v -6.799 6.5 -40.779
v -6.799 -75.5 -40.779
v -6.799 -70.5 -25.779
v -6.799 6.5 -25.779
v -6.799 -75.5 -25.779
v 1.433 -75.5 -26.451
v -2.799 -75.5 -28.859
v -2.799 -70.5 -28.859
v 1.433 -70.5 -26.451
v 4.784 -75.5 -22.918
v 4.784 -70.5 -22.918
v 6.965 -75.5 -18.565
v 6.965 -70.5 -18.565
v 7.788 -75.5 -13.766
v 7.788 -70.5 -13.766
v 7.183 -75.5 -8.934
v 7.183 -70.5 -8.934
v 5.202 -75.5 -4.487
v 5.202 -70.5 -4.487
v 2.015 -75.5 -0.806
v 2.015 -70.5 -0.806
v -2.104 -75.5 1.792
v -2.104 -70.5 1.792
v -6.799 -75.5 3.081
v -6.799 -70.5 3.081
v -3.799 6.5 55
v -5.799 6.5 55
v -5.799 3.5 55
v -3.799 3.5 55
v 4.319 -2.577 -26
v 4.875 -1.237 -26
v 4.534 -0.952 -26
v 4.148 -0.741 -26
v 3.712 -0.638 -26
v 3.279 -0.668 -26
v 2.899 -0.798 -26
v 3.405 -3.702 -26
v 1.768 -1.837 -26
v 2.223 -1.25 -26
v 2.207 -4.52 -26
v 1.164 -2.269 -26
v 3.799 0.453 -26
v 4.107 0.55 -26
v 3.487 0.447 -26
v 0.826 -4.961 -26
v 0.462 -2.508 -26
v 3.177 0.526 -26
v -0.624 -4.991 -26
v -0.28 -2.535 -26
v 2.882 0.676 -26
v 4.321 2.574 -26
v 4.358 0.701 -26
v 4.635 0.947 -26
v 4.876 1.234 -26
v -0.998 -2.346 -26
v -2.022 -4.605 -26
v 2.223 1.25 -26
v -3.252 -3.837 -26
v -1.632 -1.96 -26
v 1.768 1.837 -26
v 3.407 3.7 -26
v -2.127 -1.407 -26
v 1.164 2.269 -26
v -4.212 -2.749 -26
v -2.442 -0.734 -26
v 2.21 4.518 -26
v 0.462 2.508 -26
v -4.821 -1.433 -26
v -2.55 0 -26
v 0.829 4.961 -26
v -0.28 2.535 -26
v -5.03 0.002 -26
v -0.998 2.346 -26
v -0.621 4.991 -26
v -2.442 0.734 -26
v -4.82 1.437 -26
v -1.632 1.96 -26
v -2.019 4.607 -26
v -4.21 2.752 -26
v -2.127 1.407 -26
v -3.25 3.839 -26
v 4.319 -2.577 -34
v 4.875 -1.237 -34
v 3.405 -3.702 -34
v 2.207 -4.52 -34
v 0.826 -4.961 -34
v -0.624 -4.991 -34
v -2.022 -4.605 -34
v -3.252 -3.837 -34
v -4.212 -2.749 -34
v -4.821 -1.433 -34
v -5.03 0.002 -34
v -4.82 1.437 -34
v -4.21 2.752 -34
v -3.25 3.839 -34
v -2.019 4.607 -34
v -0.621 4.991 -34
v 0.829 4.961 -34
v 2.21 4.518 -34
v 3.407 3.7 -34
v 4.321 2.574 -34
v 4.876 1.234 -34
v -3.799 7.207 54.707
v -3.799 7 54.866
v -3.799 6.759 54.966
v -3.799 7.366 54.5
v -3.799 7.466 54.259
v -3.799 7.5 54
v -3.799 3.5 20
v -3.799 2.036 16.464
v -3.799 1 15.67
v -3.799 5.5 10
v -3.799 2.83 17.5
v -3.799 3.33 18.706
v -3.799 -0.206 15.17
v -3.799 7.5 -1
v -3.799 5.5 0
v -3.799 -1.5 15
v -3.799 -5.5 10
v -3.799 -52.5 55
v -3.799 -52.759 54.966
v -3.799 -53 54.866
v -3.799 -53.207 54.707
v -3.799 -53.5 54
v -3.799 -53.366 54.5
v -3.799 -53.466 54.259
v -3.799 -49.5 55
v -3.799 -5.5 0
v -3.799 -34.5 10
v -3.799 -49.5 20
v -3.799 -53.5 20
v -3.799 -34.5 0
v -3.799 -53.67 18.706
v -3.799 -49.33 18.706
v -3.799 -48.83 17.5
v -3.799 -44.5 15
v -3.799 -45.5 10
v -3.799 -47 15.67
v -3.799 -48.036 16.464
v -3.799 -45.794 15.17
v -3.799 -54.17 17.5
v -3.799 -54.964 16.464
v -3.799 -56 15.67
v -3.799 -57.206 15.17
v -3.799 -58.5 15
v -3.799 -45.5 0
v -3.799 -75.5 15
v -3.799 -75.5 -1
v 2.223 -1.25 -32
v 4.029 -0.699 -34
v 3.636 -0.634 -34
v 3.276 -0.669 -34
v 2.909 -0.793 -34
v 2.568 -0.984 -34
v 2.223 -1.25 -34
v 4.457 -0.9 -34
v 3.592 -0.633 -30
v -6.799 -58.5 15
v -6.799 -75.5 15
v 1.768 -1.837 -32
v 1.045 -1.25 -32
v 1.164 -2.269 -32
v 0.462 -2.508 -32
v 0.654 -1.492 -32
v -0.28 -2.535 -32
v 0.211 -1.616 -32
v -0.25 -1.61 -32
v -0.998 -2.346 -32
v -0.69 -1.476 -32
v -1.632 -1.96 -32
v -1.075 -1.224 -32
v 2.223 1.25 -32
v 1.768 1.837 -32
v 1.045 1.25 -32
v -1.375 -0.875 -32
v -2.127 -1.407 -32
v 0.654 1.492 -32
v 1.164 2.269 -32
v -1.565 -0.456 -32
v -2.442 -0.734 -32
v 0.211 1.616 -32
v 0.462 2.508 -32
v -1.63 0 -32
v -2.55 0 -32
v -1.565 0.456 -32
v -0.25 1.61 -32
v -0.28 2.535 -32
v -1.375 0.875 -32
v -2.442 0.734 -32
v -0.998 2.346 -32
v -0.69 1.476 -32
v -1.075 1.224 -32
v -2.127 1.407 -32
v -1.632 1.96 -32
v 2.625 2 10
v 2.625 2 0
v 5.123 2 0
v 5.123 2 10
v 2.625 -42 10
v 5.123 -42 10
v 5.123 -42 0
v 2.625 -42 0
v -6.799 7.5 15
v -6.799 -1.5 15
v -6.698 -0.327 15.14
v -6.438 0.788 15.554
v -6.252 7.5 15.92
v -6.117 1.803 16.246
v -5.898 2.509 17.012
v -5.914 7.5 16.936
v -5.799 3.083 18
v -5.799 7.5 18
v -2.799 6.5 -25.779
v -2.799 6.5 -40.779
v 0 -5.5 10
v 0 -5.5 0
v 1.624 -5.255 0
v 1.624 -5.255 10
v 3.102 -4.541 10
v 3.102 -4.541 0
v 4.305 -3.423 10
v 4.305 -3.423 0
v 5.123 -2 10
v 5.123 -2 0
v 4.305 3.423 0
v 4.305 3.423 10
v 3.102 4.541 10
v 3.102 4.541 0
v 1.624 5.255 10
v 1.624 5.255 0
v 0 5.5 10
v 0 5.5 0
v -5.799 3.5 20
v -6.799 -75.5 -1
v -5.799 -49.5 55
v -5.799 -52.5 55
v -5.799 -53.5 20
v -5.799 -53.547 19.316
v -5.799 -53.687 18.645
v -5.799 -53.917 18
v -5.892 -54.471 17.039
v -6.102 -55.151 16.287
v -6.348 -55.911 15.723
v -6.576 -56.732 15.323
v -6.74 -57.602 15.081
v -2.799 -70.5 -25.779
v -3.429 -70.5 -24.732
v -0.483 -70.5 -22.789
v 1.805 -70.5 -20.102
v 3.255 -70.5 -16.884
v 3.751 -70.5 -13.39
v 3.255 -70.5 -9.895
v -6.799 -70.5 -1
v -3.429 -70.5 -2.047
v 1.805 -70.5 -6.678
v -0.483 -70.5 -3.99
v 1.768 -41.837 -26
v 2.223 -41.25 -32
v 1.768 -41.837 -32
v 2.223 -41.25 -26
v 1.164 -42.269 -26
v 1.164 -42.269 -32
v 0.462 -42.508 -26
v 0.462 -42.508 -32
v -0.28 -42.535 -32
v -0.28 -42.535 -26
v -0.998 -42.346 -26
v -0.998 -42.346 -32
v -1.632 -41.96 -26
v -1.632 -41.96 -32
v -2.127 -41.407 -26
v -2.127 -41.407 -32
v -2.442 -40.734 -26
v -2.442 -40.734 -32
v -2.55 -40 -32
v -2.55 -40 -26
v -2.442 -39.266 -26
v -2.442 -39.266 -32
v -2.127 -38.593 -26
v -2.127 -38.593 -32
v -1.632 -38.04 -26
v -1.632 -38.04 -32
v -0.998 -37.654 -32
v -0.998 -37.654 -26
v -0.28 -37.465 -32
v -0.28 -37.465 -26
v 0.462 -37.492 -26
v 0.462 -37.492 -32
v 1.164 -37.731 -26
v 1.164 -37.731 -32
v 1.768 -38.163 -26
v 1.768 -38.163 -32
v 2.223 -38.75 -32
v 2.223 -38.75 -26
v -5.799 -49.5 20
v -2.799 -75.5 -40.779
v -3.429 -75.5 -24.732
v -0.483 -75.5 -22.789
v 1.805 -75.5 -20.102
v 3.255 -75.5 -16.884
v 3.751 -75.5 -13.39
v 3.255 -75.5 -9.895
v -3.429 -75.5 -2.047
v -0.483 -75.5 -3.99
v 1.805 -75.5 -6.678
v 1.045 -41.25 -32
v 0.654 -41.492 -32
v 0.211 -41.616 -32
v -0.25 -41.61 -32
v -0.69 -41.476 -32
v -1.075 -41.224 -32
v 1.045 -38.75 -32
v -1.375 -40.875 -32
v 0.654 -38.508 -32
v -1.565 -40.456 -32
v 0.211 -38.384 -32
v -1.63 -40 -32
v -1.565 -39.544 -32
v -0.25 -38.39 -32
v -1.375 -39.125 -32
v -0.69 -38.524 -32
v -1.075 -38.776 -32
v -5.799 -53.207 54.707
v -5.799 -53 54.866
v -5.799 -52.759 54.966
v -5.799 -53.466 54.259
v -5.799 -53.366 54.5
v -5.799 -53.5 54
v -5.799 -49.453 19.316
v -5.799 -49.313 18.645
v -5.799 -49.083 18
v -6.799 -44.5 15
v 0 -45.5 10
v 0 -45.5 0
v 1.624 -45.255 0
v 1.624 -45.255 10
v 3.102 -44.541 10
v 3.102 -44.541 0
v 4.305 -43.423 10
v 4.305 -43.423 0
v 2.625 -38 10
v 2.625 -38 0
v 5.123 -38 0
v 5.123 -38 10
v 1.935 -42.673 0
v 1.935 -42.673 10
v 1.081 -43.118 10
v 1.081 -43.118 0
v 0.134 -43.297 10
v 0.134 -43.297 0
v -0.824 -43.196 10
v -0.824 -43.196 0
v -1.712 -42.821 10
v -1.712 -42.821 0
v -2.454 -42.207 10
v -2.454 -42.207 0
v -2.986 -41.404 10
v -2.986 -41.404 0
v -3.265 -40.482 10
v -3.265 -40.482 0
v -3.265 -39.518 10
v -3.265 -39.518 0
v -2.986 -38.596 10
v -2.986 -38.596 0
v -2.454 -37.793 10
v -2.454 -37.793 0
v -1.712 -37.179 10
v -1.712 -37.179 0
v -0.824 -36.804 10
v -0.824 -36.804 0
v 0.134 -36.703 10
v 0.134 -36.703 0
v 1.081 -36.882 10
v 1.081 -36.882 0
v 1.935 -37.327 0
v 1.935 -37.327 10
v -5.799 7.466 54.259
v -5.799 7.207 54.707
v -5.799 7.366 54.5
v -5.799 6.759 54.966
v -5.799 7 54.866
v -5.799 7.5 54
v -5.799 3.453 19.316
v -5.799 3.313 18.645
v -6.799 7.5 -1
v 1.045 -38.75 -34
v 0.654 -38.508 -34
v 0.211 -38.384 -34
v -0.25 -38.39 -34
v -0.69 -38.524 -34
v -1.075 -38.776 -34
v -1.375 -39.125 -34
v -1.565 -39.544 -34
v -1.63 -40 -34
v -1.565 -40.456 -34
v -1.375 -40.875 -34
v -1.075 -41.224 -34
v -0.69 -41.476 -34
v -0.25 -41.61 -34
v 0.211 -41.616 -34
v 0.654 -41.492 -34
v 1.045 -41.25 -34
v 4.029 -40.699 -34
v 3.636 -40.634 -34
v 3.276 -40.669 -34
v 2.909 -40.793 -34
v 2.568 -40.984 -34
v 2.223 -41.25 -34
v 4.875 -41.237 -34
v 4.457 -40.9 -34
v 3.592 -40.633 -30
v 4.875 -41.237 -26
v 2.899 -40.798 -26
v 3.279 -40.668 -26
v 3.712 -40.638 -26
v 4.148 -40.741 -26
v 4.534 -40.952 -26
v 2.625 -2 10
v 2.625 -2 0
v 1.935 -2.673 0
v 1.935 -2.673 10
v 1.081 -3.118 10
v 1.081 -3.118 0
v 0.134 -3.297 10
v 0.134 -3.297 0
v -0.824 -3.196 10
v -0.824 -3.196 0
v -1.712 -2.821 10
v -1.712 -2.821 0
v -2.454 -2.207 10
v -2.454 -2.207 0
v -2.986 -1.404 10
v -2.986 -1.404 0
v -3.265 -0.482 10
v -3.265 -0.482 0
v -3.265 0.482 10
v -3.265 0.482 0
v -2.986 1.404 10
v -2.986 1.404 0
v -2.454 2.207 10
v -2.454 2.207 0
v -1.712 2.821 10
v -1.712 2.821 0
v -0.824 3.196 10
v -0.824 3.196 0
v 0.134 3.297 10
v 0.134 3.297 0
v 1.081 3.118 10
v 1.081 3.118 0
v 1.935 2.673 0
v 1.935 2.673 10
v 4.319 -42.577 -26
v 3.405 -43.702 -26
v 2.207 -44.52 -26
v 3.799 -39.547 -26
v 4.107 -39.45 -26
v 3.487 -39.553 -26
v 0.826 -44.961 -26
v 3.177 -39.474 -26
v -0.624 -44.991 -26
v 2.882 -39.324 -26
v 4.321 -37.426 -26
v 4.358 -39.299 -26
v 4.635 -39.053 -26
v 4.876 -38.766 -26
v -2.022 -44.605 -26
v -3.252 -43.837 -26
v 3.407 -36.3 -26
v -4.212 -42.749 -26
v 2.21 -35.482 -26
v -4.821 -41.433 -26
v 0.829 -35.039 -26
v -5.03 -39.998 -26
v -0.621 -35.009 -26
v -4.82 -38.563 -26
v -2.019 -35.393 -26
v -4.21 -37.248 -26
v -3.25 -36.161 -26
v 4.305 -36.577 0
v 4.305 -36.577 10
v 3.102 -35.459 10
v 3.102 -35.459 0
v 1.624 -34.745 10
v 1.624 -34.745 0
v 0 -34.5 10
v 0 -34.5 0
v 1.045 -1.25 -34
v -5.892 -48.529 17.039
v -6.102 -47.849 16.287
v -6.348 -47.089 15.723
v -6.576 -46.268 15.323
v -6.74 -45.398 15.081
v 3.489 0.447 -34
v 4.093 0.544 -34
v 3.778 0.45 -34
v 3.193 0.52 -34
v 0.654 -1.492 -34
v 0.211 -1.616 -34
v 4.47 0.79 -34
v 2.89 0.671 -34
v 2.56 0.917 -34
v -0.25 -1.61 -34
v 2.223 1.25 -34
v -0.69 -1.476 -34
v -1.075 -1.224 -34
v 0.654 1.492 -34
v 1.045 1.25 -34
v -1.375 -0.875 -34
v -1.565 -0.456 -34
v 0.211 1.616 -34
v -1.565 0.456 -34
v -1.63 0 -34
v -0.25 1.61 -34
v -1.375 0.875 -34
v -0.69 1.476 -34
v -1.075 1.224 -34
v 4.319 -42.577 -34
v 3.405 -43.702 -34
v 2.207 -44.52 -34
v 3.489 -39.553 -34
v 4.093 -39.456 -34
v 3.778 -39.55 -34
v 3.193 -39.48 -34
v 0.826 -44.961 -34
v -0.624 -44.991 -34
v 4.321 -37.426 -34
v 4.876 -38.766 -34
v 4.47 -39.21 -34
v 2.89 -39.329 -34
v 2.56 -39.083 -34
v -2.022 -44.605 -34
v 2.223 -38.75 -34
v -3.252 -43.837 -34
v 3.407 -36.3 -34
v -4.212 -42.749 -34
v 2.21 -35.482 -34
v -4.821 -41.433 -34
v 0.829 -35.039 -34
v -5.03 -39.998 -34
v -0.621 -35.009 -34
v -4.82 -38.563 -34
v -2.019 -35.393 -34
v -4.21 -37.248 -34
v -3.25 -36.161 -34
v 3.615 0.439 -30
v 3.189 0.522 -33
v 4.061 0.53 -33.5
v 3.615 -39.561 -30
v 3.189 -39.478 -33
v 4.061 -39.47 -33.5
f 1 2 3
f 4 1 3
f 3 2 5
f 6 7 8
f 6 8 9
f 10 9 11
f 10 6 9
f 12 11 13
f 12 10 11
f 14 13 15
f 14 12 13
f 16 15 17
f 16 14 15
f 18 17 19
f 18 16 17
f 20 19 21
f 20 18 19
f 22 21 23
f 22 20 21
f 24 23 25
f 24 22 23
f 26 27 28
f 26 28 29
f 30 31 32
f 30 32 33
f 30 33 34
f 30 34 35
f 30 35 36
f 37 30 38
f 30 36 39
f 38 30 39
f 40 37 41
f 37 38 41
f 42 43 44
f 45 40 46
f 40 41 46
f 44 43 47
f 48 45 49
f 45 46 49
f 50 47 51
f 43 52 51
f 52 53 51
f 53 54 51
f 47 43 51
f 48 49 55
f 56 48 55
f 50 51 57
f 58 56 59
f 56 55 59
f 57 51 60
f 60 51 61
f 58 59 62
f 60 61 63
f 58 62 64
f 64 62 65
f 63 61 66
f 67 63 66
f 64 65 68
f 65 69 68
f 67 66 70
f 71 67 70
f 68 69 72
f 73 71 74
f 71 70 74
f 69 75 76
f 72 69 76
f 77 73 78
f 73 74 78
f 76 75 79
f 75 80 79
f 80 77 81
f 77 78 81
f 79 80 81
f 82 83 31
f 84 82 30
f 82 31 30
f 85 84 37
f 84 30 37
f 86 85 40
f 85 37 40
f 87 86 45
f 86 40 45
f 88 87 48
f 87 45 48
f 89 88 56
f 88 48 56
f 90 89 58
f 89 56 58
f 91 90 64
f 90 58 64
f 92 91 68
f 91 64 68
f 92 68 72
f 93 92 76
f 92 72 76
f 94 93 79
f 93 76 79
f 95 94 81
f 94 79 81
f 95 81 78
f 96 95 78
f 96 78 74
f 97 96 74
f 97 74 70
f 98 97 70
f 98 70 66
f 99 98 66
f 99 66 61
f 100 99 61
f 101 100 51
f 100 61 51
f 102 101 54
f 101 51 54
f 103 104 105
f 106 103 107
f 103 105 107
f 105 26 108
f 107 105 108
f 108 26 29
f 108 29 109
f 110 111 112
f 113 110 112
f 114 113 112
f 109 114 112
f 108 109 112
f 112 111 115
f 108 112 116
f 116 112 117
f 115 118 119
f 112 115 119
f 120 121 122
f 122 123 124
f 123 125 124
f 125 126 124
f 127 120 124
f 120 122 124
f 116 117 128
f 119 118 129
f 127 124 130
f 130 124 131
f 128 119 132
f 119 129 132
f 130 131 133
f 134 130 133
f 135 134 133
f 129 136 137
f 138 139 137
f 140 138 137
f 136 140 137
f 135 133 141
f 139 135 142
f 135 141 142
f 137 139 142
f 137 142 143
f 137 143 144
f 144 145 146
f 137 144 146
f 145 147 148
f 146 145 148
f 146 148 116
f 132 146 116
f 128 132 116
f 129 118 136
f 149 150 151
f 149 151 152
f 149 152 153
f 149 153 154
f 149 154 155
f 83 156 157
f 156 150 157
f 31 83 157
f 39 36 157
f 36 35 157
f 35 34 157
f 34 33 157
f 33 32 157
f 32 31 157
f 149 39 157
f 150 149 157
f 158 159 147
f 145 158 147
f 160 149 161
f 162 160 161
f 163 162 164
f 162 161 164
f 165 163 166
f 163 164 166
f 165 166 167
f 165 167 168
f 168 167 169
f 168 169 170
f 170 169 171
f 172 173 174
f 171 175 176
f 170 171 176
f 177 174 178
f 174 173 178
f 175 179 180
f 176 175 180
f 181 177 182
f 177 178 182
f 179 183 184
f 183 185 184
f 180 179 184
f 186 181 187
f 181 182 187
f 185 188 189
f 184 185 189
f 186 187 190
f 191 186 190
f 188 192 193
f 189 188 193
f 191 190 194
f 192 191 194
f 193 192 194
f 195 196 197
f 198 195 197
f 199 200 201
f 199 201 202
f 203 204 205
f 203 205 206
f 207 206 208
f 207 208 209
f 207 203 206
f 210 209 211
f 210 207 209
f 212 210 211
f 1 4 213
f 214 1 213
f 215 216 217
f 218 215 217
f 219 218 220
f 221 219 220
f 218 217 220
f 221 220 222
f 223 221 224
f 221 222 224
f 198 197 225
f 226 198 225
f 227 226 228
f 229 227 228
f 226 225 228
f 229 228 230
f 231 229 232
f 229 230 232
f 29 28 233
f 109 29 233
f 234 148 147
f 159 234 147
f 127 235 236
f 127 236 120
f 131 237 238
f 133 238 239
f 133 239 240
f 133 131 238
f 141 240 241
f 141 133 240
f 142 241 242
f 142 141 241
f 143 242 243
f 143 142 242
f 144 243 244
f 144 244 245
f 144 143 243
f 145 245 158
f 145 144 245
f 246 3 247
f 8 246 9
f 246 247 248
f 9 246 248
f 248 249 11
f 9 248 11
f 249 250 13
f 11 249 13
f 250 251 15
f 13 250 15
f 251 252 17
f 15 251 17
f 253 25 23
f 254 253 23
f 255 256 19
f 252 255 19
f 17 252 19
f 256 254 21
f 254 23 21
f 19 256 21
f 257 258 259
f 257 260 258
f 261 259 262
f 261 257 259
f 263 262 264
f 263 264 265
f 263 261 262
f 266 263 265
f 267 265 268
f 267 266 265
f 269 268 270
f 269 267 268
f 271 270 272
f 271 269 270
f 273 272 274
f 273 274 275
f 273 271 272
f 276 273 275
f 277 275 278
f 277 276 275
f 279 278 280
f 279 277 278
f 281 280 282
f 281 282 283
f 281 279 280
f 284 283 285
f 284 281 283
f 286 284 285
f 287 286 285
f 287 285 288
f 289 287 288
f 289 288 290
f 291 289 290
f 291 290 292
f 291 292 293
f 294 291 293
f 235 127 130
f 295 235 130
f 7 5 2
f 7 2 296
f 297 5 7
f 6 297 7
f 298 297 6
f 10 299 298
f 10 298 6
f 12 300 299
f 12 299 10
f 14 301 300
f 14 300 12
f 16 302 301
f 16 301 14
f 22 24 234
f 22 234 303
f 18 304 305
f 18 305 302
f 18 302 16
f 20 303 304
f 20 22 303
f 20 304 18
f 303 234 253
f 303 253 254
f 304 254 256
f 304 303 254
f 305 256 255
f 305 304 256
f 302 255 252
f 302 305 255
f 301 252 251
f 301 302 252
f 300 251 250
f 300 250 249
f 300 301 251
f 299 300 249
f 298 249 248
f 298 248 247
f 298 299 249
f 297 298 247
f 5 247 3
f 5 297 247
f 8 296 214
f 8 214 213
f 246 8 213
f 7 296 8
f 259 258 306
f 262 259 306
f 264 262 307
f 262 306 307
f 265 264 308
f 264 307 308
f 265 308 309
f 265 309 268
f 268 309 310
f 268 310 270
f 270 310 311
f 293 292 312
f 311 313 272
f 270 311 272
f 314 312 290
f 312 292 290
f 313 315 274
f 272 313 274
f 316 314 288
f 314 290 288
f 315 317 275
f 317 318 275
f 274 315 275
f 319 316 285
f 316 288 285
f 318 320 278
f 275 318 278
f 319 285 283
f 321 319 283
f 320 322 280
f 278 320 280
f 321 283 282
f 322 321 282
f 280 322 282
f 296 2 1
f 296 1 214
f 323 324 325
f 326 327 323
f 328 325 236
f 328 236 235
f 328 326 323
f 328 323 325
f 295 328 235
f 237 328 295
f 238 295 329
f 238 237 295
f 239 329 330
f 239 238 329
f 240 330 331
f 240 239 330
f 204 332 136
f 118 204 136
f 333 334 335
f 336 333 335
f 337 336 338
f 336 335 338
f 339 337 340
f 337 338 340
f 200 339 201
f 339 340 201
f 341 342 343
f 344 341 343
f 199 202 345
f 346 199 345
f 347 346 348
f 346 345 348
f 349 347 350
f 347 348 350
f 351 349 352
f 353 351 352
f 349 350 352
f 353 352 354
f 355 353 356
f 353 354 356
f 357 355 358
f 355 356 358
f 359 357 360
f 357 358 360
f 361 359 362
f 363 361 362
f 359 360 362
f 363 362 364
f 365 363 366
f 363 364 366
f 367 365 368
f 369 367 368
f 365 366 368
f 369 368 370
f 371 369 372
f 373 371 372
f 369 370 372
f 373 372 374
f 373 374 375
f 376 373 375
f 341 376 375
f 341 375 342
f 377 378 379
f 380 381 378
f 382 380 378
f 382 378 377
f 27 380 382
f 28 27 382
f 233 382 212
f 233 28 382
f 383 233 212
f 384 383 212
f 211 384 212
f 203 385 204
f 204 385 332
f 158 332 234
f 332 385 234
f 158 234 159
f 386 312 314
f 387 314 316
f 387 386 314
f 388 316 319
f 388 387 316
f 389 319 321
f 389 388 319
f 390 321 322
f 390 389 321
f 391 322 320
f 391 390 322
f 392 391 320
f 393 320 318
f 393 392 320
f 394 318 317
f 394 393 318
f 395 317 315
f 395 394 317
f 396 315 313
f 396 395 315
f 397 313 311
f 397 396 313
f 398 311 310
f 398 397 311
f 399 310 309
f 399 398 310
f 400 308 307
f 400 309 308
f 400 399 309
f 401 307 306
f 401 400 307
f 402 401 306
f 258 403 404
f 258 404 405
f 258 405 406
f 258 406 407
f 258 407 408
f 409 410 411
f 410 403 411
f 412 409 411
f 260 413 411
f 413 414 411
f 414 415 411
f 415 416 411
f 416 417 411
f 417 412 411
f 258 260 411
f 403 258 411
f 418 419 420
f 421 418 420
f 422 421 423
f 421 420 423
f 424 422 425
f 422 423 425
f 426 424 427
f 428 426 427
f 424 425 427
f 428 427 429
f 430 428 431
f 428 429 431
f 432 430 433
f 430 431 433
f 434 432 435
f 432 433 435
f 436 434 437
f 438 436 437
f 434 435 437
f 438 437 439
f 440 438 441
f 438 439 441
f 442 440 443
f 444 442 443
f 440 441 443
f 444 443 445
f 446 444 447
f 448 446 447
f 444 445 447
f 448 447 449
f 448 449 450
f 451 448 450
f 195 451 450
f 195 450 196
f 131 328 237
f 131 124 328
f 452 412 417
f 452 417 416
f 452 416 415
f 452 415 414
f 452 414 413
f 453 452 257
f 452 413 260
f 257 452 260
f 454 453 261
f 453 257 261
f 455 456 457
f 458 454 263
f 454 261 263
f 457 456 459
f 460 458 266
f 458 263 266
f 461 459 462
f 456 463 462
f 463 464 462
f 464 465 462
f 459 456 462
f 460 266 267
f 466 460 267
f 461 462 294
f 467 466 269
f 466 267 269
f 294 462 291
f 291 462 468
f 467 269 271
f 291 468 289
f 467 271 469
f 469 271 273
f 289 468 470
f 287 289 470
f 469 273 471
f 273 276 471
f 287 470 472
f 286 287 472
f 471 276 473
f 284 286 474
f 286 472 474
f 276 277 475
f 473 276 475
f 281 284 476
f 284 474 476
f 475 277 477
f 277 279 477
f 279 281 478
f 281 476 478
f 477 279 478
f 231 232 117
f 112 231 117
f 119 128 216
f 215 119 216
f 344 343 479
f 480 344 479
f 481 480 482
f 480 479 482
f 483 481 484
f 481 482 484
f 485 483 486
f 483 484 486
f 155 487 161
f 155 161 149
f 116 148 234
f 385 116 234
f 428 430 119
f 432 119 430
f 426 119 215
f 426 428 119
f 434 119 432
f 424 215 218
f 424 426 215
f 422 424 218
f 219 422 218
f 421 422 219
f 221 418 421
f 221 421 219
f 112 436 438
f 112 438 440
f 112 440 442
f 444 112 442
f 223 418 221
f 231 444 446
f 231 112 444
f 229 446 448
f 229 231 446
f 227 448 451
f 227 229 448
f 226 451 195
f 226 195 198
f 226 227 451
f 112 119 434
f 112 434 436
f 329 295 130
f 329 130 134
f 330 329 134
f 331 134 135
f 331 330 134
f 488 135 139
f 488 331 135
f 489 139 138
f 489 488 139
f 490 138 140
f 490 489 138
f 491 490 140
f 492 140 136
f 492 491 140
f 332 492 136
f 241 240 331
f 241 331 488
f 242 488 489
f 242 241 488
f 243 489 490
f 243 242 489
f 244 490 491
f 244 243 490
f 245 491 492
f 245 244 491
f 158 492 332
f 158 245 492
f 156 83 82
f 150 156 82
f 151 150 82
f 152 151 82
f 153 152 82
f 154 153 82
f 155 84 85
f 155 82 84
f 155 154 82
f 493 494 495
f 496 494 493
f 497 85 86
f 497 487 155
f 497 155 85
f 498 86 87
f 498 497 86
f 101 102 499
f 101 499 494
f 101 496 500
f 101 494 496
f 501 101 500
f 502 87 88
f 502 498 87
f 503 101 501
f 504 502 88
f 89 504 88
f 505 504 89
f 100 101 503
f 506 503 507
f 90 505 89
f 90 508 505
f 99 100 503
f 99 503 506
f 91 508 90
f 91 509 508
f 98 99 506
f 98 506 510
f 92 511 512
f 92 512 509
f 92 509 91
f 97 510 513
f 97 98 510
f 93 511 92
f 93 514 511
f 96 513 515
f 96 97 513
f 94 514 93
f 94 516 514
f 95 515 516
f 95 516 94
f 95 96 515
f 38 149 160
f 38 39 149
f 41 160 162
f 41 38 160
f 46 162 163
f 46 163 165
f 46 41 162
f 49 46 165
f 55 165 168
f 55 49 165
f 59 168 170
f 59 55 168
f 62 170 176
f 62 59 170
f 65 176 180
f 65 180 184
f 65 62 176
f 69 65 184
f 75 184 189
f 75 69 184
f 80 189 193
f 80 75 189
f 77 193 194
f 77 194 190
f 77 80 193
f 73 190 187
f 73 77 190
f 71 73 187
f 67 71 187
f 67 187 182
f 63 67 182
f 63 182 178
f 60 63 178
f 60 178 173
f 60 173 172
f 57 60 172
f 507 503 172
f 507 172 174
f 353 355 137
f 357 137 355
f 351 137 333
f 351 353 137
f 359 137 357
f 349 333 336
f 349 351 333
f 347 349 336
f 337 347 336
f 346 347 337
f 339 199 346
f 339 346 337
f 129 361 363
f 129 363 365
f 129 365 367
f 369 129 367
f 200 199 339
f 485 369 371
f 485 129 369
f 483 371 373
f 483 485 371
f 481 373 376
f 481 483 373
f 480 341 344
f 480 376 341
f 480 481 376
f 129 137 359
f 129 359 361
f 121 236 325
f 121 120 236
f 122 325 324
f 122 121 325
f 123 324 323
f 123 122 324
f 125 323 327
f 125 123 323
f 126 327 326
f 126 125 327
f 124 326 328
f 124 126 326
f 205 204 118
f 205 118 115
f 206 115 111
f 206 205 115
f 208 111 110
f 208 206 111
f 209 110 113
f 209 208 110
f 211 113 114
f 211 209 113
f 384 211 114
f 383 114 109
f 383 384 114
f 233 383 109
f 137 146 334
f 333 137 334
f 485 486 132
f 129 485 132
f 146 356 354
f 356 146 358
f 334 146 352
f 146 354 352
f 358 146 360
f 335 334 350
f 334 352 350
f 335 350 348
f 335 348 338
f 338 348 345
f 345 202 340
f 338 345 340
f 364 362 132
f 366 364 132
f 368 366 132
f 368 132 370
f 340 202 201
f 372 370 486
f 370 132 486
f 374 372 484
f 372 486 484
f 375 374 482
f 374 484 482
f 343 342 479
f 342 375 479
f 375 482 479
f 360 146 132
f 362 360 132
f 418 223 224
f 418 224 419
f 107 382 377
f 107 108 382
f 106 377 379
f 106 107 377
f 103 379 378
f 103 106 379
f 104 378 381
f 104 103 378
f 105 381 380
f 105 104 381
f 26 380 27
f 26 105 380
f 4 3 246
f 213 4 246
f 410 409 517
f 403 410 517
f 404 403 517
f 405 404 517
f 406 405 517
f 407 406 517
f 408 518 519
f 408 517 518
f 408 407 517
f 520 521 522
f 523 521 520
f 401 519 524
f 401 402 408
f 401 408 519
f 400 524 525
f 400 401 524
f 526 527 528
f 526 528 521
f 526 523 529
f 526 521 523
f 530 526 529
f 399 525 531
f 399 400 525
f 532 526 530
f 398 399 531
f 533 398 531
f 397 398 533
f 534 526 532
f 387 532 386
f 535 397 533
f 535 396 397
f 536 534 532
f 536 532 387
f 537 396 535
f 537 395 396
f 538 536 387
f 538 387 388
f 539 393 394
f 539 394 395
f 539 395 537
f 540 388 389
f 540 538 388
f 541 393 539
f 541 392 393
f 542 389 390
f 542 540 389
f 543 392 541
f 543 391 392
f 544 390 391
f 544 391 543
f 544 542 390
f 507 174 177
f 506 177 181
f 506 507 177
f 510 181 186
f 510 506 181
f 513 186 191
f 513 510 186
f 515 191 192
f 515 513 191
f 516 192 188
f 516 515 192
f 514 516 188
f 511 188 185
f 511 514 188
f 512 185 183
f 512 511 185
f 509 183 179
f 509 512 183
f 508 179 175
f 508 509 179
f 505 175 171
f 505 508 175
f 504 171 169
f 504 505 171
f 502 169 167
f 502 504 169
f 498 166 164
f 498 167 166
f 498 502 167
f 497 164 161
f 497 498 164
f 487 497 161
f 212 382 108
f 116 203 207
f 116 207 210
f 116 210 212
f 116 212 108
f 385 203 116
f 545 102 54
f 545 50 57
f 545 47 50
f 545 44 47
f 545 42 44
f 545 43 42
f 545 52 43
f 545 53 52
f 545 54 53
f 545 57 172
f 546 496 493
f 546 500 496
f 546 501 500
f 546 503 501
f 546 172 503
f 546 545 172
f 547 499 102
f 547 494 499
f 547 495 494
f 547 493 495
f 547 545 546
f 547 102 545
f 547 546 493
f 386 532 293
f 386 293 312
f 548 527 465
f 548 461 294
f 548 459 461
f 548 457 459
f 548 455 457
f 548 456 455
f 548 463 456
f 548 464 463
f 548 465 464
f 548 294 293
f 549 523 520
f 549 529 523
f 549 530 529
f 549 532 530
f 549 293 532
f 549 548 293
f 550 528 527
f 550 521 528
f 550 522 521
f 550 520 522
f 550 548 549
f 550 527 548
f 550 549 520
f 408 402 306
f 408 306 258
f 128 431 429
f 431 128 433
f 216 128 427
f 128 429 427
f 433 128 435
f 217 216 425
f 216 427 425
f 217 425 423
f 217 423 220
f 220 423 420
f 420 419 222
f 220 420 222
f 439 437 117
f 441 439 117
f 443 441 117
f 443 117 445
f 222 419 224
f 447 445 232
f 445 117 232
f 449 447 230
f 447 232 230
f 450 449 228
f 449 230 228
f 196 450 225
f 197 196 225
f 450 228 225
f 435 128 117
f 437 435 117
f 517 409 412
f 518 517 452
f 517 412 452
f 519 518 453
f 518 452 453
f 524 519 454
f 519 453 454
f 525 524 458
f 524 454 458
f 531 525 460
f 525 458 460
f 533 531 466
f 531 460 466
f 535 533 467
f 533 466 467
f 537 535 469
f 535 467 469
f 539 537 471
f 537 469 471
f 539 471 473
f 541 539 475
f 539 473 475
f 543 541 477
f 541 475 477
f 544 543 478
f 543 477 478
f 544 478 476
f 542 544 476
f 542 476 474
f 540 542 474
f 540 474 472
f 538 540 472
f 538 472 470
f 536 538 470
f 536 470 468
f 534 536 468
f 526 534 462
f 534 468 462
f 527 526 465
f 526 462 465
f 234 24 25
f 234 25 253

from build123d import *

# Parameters (mm, degrees)
BOSS_EXTRUDE1_DEPTH     = 10
BOSS_EXTRUDE1_2_DEPTH   = 10
SKETCH2_W               = 16
SKETCH2_H               = 63
BOSS_EXTRUDE2_DEPTH     = 3
BOSS_EXTRUDE3_DEPTH     = 5
SKETCH5_W               = 4
SKETCH5_H               = 15
BOSS_EXTRUDE4_DEPTH     = 82
BOSS_EXTRUDE5_START     = 26
SKETCH7_R               = 5.029708881
BOSS_EXTRUDE5_DEPTH     = 8
SKETCH6_R               = 2.55
CUT_EXTRUDE1_DEPTH      = 32
CUT_EXTRUDE2_DEPTH      = 10
CUT_EXTRUDE2_DEPTH_BACK = 2
LPATTERN1_COUNT         = 2
LPATTERN1_PITCH         = 40
SKETCH9_W               = 2
SKETCH9_H               = 4
BOSS_EXTRUDE6_DEPTH     = 40
FILLET1_R               = 5
FILLET2_R               = 1


with BuildPart() as part:
    # Sketch1 → Boss-Extrude1 (new body)
    with BuildSketch(Plane.XY):
        with BuildLine():
            Line((0, 5.5), (-3.799215788, 5.5))
            Line((-3.799215788, 5.5), (-3.799215788, -5.5))
            Line((-3.799215788, -5.5), (0, -5.5))
            ThreePointArc((0, -5.5), (3.102418411, -4.541475531), (5.123475383, -2))
            Line((5.123475383, -2), (2.62488095, -2))
            ThreePointArc((2.62488095, -2), (-3.3, 0), (2.62488095, 2))
            Line((2.62488095, 2), (5.123475383, 2))
            ThreePointArc((5.123475383, 2), (3.102418411, 4.541475531), (0, 5.5))
        make_face()
    extrude(amount=BOSS_EXTRUDE1_DEPTH)



with BuildPart() as body_2:
    # Sketch1 → Boss-Extrude1 2 (new body)
    with BuildSketch(Plane.XY):
        with BuildLine():
            Line((2.62488095, -38), (5.123475383, -38))
            ThreePointArc((5.123475383, -38), (3.102418411, -35.458524469), (0, -34.5))
            Line((0, -34.5), (-3.799215788, -34.5))
            Line((-3.799215788, -34.5), (-3.799215788, -45.5))
            Line((-3.799215788, -45.5), (0, -45.5))
            ThreePointArc((0, -45.5), (3.102418411, -44.541475531), (5.123475383, -42))
            Line((5.123475383, -42), (2.62488095, -42))
            ThreePointArc((2.62488095, -42), (-3.3, -40), (2.62488095, -38))
        make_face()
    extrude(amount=BOSS_EXTRUDE1_2_DEPTH)


with BuildPart() as part_1:
    add(part.part)

    add(body_2.part)  # Boss-Extrude2 merges body 2
    # Sketch2 → Boss-Extrude2 (add)
    with BuildSketch(Plane.ZY.offset(3.799215788)):
        with Locations((7, -24)):
            Rectangle(SKETCH2_W, SKETCH2_H)
    extrude(amount=BOSS_EXTRUDE2_DEPTH)

    # Sketch3 → section 1 of loft1
    with BuildSketch(Plane(origin=(0, -75.5, 0), x_dir=(-1, 0, 0), z_dir=(0, -1, 0)), mode=Mode.PRIVATE) as loft1_s1:
        with BuildLine():
            Line((6.799215788, 1), (3.799215788, 1))
            Line((3.799215788, 1), (3.799215788, -15))
            Line((3.799215788, -15), (6.799215788, -15))
            Line((6.799215788, -15), (6.799215788, 1))
        make_face()
    # loft from a face of the part (loft1)
    loft([part_1.faces().sort_by_distance((-5.299215788, -55.5, 7))[0], loft1_s1.sketch])

    # Sketch9 → Boss-Extrude6 (add)
    with BuildSketch(Plane.XY.offset(15)):
        with Locations((-4.799215788, 5.5)):
            Rectangle(SKETCH9_W, SKETCH9_H)
        with Locations((-4.799215788, -51.5)):
            Rectangle(SKETCH9_W, SKETCH9_H)
    extrude(amount=BOSS_EXTRUDE6_DEPTH)

    # Fillet1
    # the kernel refuses this fillet: 5 mm, written as the material it adds along each edge
    with BuildSketch(Plane(origin=(-5.799215788, 7.5, 15), x_dir=(0, 0, 1), z_dir=(0, -1, 0))) as fillet1_piece_1:
        with BuildLine():
            CenterArc((3, 5), FILLET1_R, 233.130102354, 36.869897646)
            Line((0, 1), (-0.06, 0.92))
            ThreePointArc((-0.06, 0.92), (-0.1, 0.5), (-0.1, 0))
            Line((-0.1, 0), (0, -0.1))
            Line((0, -0.1), (3, -0.1))
            Line((3, -0.1), (3, 0))
        make_face()
    extrude(amount=4)
    with BuildSketch(Plane(origin=(-5.799215788, -53.5, 15), x_dir=(0, 0, 1), z_dir=(0, 1, 0))) as fillet1_piece_2:
        with BuildLine():
            CenterArc((3, -5), FILLET1_R, 90, 36.869897646)
            Line((0, -1), (-0.06, -0.92))
            ThreePointArc((-0.06, -0.92), (-0.1, -0.5), (-0.1, 0))
            Line((-0.1, 0), (0, 0.1))
            Line((0, 0.1), (3, 0.1))
            Line((3, 0.1), (3, 0))
        make_face()
    extrude(amount=4)
    with BuildSketch(Plane(origin=(-5.799215788, -49.5, 15), x_dir=(0, 0, 1), z_dir=(1, 0, 0)), Plane(origin=(-3.799215788, -53.5, 15), x_dir=(0, 0, 1), z_dir=(-1, 0, 0))) as fillet1_piece_3:
        with BuildLine():
            CenterArc((FILLET1_R, -FILLET1_R), FILLET1_R, 90, 90)
            Line((0, -FILLET1_R), (-FILLET1_R * 0.02, -FILLET1_R))
            Line((-FILLET1_R * 0.02, -FILLET1_R), (-FILLET1_R * 0.02, FILLET1_R * 0.02))
            Line((-FILLET1_R * 0.02, FILLET1_R * 0.02), (FILLET1_R, FILLET1_R * 0.02))
            Line((FILLET1_R, FILLET1_R * 0.02), (FILLET1_R, 0))
        make_face()
    extrude(amount=2)
    with BuildSketch(Plane(origin=(-5.799215788, 3.5, 15), x_dir=(0, 0, 1), z_dir=(1, 0, 0))) as fillet1_piece_4:
        with BuildLine():
            CenterArc((FILLET1_R, FILLET1_R), FILLET1_R, 180, 90)
            Line((0, FILLET1_R), (-FILLET1_R * 0.02, FILLET1_R))
            Line((-FILLET1_R * 0.02, FILLET1_R), (-FILLET1_R * 0.02, -FILLET1_R * 0.02))
            Line((-FILLET1_R * 0.02, -FILLET1_R * 0.02), (FILLET1_R, -FILLET1_R * 0.02))
            Line((FILLET1_R, -FILLET1_R * 0.02), (FILLET1_R, 0))
        make_face()
    extrude(amount=2)
    with BuildSketch(Plane(origin=(-18.299215788, 3.5, 15), x_dir=(0, 0, 1), z_dir=(1, 0, 0))) as fillet1_piece_5a_section:
        with BuildLine():
            CenterArc((FILLET1_R, FILLET1_R), FILLET1_R, 180, 90)
            Line((0, FILLET1_R), (-FILLET1_R * 0.02, FILLET1_R))
            Line((-FILLET1_R * 0.02, FILLET1_R), (-FILLET1_R * 0.02, -FILLET1_R * 0.02))
            Line((-FILLET1_R * 0.02, -FILLET1_R * 0.02), (FILLET1_R, -FILLET1_R * 0.02))
            Line((FILLET1_R, -FILLET1_R * 0.02), (FILLET1_R, 0))
        make_face()
    fillet1_piece_5a = extrude(amount=14.5, mode=Mode.PRIVATE)
    fillet1_piece_5a = split(fillet1_piece_5a, bisect_by=Plane(origin=(-5.799215788, 2.368024429, 16.131975571), z_dir=(-1, 0, 0)), keep=Keep.TOP, mode=Mode.PRIVATE)
    fillet1_piece_5a = split(fillet1_piece_5a, bisect_by=Plane(origin=(-6.799215788, 2.368024429, 16.131975571), z_dir=(1, 0, 0)), keep=Keep.TOP, mode=Mode.PRIVATE)
    with BuildSketch(Plane(origin=(-5.799215788, 7.5, 15), x_dir=(0, 0, 1), z_dir=(0, -1, 0))) as fillet1_piece_5b_section:
        with BuildLine():
            CenterArc((3, 5), FILLET1_R, 233.130102354, 36.869897646)
            Line((0, 1), (-0.06, 0.92))
            ThreePointArc((-0.06, 0.92), (-0.1, 0.5), (-0.1, 0))
            Line((-0.1, 0), (0, -0.1))
            Line((0, -0.1), (3, -0.1))
            Line((3, -0.1), (3, 0))
        make_face()
    fillet1_piece_5b = extrude(amount=11.5, mode=Mode.PRIVATE)
    fillet1_piece_5b = split(fillet1_piece_5b, bisect_by=Plane(origin=(-6.025404186, 3.5, 15.849672813), z_dir=(0, -1, 0)), keep=Keep.TOP, mode=Mode.PRIVATE)
    fillet1_piece_5 = fillet1_piece_5a & fillet1_piece_5b
    add(fillet1_piece_5)
    with BuildSketch(Plane(origin=(-3.799215788, -53.5, 15), x_dir=(0, 0, 1), z_dir=(-1, 0, 0))) as fillet1_piece_6a_section:
        with BuildLine():
            CenterArc((FILLET1_R, -FILLET1_R), FILLET1_R, 90, 90)
            Line((0, -FILLET1_R), (-FILLET1_R * 0.02, -FILLET1_R))
            Line((-FILLET1_R * 0.02, -FILLET1_R), (-FILLET1_R * 0.02, FILLET1_R * 0.02))
            Line((-FILLET1_R * 0.02, FILLET1_R * 0.02), (FILLET1_R, FILLET1_R * 0.02))
            Line((FILLET1_R, FILLET1_R * 0.02), (FILLET1_R, 0))
        make_face()
    fillet1_piece_6a = extrude(amount=14.5, mode=Mode.PRIVATE)
    fillet1_piece_6a = split(fillet1_piece_6a, bisect_by=Plane(origin=(-5.799215788, -54.631975571, 16.131975571), z_dir=(-1, 0, 0)), keep=Keep.TOP, mode=Mode.PRIVATE)
    fillet1_piece_6a = split(fillet1_piece_6a, bisect_by=Plane(origin=(-6.799215788, -54.631975571, 16.131975571), z_dir=(1, 0, 0)), keep=Keep.TOP, mode=Mode.PRIVATE)
    with BuildSketch(Plane(origin=(-5.799215788, -61, 15), x_dir=(0, 0, 1), z_dir=(0, 1, 0))) as fillet1_piece_6b_section:
        with BuildLine():
            CenterArc((3, -5), FILLET1_R, 90, 36.869897646)
            Line((0, -1), (-0.06, -0.92))
            ThreePointArc((-0.06, -0.92), (-0.1, -0.5), (-0.1, 0))
            Line((-0.1, 0), (0, 0.1))
            Line((0, 0.1), (3, 0.1))
            Line((3, 0.1), (3, 0))
        make_face()
    fillet1_piece_6b = extrude(amount=11.5, mode=Mode.PRIVATE)
    fillet1_piece_6b = split(fillet1_piece_6b, bisect_by=Plane(origin=(-6.025404186, -53.5, 15.849672813), z_dir=(0, -1, 0)), keep=Keep.TOP, mode=Mode.PRIVATE)
    fillet1_piece_6 = fillet1_piece_6a & fillet1_piece_6b
    add(fillet1_piece_6)
    with BuildSketch(Plane(origin=(-5.799215788, -53.5, 15), x_dir=(0, 0, 1), z_dir=(0, 1, 0))) as fillet1_piece_7a_section:
        with BuildLine():
            CenterArc((3, -5), FILLET1_R, 90, 36.869897646)
            Line((0, -1), (-0.06, -0.92))
            ThreePointArc((-0.06, -0.92), (-0.1, -0.5), (-0.1, 0))
            Line((-0.1, 0), (0, 0.1))
            Line((0, 0.1), (3, 0.1))
            Line((3, 0.1), (3, 0))
        make_face()
    fillet1_piece_7a = extrude(amount=11.5, mode=Mode.PRIVATE)
    fillet1_piece_7a = split(fillet1_piece_7a, bisect_by=Plane(origin=(-6.025404186, -49.5, 15.849672813), z_dir=(0, 1, 0)), keep=Keep.TOP, mode=Mode.PRIVATE)
    with BuildSketch(Plane(origin=(-18.299215788, -49.5, 15), x_dir=(0, 0, 1), z_dir=(1, 0, 0))) as fillet1_piece_7b_section:
        with BuildLine():
            CenterArc((FILLET1_R, -FILLET1_R), FILLET1_R, 90, 90)
            Line((0, -FILLET1_R), (-FILLET1_R * 0.02, -FILLET1_R))
            Line((-FILLET1_R * 0.02, -FILLET1_R), (-FILLET1_R * 0.02, FILLET1_R * 0.02))
            Line((-FILLET1_R * 0.02, FILLET1_R * 0.02), (FILLET1_R, FILLET1_R * 0.02))
            Line((FILLET1_R, FILLET1_R * 0.02), (FILLET1_R, 0))
        make_face()
    fillet1_piece_7b = extrude(amount=14.5, mode=Mode.PRIVATE)
    fillet1_piece_7b = split(fillet1_piece_7b, bisect_by=Plane(origin=(-5.799215788, -48.368024429, 16.131975571), z_dir=(-1, 0, 0)), keep=Keep.TOP, mode=Mode.PRIVATE)
    fillet1_piece_7b = split(fillet1_piece_7b, bisect_by=Plane(origin=(-6.799215788, -48.368024429, 16.131975571), z_dir=(1, 0, 0)), keep=Keep.TOP, mode=Mode.PRIVATE)
    fillet1_piece_7 = fillet1_piece_7a & fillet1_piece_7b
    add(fillet1_piece_7)

    # Fillet2
    fillet2_edges = [part_1.edges().sort_by_distance(p)[0] for p in [
        (-4.799215788, 7.5, 55),
        (-4.799215788, -53.5, 55),
    ]]
    fillet(fillet2_edges, radius=FILLET2_R)


with BuildPart() as body_2_2:
    # Sketch4 → Boss-Extrude3 (new body)
    with BuildSketch(Plane.XZ.offset(75.5)):
        with BuildLine():
            Line((-6.799215788, 3.081354008), (-6.799215788, -1))
            ThreePointArc((-6.799215788, -1), (3.750784212, -13.389612585), (-6.799215788, -25.779225169))
            Line((-6.799215788, -25.779225169), (-6.799215788, -29.860579178))
            ThreePointArc((-6.799215788, -29.860579178), (7.792732274, -13.389612585), (-6.799215788, 3.081354008))
        make_face()
    extrude(amount=-BOSS_EXTRUDE3_DEPTH)

    # Sketch5 → Boss-Extrude4 (add)
    with BuildSketch(Plane.XZ.offset(75.5)):
        with Locations((-4.799215788, -33.279225169)):
            Rectangle(SKETCH5_W, SKETCH5_H)
    extrude(amount=-BOSS_EXTRUDE4_DEPTH)


with BuildPart() as body_3:
    # Sketch7 → Boss-Extrude5 (new body)
    with BuildSketch(Plane(origin=(0, 0, 0), x_dir=(-1, 0, 0), z_dir=(0, 0, -1)).offset(BOSS_EXTRUDE5_START)):
        Circle(SKETCH7_R)
    extrude(amount=BOSS_EXTRUDE5_DEPTH)

    # Sketch6 → Cut-Extrude1 (cut)
    with BuildSketch(Plane(origin=(0, 0, 0), x_dir=(-1, 0, 0), z_dir=(0, 0, -1))):
        Circle(SKETCH6_R)
    extrude(amount=CUT_EXTRUDE1_DEPTH, mode=Mode.SUBTRACT)

    # Sketch8 → Cut-Extrude2 (cut, two sides: drawn at the far end of the back side and taken through both)
    with BuildSketch(Plane.XY.offset(-32).offset(-CUT_EXTRUDE2_DEPTH_BACK)):
        with BuildLine():
            Line((4.8880156, -1.25), (6.306665545, -1.25))
            Line((6.306665545, -1.25), (6.306665545, 1.25))
            Line((6.306665545, 1.25), (4.8880156, 1.25))
            add(Edge.make_bspline(
                [(4.8880156, 1.25), (3.688676314, -0.372376085), (2.222611077, 1.25)],
                knots=[0, 0, 0, 1, 1, 1], degree=2))
            Line((2.222611077, 1.25), (1.045365469, 1.25))
            ThreePointArc((1.045365469, 1.25), (-1.629505742, 0), (1.045365469, -1.25))
            Line((1.045365469, -1.25), (2.222611077, -1.25))
            add(Edge.make_bspline(
                [(4.8880156, -1.25), (3.642215678, -0.016247262), (2.222611077, -1.25)],
                knots=[0, 0, 0, 1, 1, 1], degree=2))
        make_face()
    extrude(amount=CUT_EXTRUDE2_DEPTH + CUT_EXTRUDE2_DEPTH_BACK, mode=Mode.SUBTRACT)


with BuildPart() as lpattern1_1:
    # LPattern1: pattern copy
    add(body_3.part.moved(Location(Vector(0, -1, 0) * (1 * LPATTERN1_PITCH))))


solid = Compound([part_1.part, body_2_2.part, body_3.part, lpattern1_1.part])
